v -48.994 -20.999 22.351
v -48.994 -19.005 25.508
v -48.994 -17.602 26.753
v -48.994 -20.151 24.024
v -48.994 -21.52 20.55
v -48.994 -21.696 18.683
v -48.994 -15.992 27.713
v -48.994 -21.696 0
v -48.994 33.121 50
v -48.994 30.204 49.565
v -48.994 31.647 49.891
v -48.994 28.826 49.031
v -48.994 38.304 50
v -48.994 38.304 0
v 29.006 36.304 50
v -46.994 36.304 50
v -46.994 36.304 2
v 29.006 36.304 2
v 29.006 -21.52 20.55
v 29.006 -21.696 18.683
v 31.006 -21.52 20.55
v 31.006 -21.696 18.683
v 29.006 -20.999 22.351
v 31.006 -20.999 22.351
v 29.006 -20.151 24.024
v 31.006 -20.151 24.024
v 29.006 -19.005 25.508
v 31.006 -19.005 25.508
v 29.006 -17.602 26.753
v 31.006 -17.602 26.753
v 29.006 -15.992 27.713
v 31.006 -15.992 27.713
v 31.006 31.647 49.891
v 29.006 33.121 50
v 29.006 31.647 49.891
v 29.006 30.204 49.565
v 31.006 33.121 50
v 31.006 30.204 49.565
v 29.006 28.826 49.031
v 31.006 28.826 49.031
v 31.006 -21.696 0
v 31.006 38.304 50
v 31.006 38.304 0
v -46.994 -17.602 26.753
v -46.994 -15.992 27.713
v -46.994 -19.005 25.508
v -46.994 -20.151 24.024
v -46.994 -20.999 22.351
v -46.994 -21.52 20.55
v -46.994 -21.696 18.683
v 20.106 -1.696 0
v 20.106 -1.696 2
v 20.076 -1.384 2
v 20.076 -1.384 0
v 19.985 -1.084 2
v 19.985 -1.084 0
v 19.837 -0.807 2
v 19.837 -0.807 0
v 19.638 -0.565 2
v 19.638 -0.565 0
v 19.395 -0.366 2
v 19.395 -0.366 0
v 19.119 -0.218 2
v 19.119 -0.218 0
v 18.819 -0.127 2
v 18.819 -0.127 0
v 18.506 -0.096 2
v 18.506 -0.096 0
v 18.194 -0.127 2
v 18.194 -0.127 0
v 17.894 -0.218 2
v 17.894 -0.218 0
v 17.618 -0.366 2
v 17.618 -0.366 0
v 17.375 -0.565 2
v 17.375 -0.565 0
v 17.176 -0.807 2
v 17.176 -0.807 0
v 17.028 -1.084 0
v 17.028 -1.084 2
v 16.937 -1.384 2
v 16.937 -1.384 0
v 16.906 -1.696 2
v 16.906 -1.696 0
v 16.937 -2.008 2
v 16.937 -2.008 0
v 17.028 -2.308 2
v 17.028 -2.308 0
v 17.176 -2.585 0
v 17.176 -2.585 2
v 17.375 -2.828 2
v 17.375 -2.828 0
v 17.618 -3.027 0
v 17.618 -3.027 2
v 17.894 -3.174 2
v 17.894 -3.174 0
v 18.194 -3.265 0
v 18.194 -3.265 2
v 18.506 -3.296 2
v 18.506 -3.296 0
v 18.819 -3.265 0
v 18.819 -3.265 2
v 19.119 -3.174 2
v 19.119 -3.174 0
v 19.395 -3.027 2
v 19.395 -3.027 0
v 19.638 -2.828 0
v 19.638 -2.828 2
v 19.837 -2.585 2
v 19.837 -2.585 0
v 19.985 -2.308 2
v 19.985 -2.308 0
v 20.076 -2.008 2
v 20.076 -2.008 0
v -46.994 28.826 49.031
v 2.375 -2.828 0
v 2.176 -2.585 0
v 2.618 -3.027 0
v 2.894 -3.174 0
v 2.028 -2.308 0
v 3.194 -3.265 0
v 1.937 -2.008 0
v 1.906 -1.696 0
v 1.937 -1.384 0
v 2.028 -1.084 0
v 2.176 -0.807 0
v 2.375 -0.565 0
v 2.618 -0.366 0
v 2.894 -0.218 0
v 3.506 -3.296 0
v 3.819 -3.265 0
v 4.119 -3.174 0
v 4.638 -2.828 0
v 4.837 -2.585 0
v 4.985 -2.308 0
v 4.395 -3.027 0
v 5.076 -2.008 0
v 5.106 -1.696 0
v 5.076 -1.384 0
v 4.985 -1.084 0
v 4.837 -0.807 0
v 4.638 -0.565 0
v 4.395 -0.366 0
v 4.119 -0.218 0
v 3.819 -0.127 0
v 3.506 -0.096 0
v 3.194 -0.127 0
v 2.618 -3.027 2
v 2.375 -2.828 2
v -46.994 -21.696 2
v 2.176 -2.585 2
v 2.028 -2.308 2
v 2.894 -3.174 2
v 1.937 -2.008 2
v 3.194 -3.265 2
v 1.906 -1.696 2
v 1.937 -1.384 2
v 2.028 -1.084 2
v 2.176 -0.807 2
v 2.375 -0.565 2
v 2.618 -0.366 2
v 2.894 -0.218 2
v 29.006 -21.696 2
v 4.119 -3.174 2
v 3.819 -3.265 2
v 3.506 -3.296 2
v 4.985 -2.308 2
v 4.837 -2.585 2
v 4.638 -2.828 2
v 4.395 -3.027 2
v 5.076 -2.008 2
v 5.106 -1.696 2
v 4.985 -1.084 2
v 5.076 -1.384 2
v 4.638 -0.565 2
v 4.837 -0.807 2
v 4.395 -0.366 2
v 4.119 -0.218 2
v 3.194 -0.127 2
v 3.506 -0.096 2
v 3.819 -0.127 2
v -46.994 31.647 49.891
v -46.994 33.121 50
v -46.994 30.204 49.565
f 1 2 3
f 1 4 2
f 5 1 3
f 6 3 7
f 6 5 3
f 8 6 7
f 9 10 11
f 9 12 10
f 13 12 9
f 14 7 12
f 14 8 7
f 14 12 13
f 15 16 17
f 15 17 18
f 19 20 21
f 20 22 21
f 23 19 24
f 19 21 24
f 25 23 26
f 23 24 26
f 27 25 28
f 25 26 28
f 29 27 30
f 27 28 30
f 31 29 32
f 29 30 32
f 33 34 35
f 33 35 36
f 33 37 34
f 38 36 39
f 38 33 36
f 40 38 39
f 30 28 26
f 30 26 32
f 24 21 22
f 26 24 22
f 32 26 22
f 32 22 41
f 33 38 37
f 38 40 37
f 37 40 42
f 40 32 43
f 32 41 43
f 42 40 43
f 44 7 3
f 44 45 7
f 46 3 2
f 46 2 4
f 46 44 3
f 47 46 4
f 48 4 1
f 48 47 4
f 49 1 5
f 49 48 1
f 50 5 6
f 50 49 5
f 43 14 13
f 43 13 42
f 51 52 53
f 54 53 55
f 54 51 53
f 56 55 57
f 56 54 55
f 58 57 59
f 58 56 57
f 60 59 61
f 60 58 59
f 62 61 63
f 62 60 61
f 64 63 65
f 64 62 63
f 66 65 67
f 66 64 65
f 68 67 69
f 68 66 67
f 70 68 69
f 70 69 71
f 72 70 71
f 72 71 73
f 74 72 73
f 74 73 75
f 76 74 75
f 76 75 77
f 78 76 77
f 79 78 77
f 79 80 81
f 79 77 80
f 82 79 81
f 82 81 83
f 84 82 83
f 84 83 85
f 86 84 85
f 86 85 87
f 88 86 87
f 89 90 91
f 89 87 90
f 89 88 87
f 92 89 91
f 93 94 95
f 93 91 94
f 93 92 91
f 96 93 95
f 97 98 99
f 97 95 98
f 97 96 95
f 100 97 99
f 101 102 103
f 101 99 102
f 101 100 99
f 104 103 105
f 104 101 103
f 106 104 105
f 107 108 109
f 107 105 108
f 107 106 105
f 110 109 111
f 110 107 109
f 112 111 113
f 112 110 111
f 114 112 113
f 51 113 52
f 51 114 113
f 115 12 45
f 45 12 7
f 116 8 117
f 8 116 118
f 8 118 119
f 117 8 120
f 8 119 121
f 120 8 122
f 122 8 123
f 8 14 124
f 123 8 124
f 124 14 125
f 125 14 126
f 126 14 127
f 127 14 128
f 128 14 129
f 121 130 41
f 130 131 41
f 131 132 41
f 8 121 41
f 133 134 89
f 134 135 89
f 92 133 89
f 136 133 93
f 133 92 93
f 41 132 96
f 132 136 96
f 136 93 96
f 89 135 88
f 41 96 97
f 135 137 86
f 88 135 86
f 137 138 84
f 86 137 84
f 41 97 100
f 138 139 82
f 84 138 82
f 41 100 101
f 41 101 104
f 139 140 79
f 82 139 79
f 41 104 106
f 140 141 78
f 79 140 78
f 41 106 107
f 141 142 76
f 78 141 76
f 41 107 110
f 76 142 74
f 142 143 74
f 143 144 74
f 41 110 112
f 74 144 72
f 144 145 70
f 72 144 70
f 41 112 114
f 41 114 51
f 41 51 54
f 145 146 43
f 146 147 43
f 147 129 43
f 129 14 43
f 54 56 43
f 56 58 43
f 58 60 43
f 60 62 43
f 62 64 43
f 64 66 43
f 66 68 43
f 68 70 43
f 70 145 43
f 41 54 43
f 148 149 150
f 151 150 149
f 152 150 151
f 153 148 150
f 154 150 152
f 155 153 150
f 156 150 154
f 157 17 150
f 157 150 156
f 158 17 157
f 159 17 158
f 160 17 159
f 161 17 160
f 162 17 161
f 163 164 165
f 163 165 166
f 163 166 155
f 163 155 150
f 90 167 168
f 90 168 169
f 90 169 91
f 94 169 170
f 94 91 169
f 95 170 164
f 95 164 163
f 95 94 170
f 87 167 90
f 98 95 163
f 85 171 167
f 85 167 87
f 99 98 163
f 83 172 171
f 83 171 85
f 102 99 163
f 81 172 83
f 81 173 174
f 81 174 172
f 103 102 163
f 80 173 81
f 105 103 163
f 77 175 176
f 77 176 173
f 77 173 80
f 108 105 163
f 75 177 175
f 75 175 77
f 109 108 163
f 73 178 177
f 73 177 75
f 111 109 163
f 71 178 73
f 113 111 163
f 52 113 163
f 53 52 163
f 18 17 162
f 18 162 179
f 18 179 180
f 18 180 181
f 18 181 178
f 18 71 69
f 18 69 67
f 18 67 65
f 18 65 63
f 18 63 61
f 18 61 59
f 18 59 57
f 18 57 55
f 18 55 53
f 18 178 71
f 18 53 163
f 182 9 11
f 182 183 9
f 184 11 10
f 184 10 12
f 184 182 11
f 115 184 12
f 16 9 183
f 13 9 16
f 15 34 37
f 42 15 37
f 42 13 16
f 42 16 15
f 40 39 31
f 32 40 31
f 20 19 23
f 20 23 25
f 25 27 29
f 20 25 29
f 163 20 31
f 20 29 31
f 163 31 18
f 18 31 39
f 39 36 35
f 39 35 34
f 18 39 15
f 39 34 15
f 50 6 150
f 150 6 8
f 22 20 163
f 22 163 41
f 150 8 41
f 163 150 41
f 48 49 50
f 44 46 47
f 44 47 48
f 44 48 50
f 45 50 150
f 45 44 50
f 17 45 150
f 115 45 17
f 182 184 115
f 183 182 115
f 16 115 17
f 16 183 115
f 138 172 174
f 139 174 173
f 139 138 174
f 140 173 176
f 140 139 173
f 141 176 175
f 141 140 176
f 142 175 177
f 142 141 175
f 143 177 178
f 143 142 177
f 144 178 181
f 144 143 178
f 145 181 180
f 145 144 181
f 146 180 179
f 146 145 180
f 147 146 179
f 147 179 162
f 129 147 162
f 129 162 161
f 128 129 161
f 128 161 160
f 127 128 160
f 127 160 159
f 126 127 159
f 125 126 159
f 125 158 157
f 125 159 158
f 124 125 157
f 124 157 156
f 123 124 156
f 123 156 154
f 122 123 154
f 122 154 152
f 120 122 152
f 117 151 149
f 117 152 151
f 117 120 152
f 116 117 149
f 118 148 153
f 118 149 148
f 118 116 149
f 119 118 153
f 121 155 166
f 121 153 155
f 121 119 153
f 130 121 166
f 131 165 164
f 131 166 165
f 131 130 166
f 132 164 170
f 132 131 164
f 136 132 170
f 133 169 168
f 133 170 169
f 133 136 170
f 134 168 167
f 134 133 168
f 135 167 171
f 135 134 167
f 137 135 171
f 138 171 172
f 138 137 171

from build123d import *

# Parameters (mm, degrees)
SKETCH_1_W          = 80
SKETCH_1_H          = 60
SKETCH_1_R          = 1.6
EXTRUDE_1_DEPTH     = 50
SKETCH_2_W          = 76
SKETCH_2_H          = 58
CUT_EXTRUDE_1_DEPTH = 48
CUT_EXTRUDE_2_DEPTH = 81
FILLET_1_R          = 10


with BuildPart() as part:
    # 草图1 → 凸台-拉伸1 (new body)
    with BuildSketch(Plane.XY):
        with Locations((-8.993547962, 8.303805385)):
            Rectangle(SKETCH_1_W, SKETCH_1_H)
        with Locations((3.506452038, -1.696194615)):
            Circle(SKETCH_1_R, mode=Mode.SUBTRACT)
        with Locations((18.506452038, -1.696194615)):
            Circle(SKETCH_1_R, mode=Mode.SUBTRACT)
    extrude(amount=EXTRUDE_1_DEPTH)

    # 草图2 → 切除-拉伸1 (cut)
    with BuildSketch(Plane.XY.offset(50)):
        with Locations((-8.993547962, 7.303805385)):
            Rectangle(SKETCH_2_W, SKETCH_2_H)
    extrude(amount=-CUT_EXTRUDE_1_DEPTH, mode=Mode.SUBTRACT)

    # 草图3 → 切除-拉伸2 (cut, through all)
    with BuildSketch(Plane.ZY.offset(48.993547962)):
        Polygon((50, 30.864185465), (25, -21.696194615), (50, -21.696194615), align=None)
    extrude(amount=-CUT_EXTRUDE_2_DEPTH, mode=Mode.SUBTRACT)

    # 圆角1
    fillet_1_edges = [part.edges().sort_by_distance(p)[0] for p in [
        (-47.993547962, 30.864185465, 50),
        (30.006452038, 30.864185465, 50),
        (-47.993547962, -21.696194615, 25),
        (30.006452038, -21.696194615, 25),
    ]]
    fillet(fillet_1_edges, radius=FILLET_1_R)


solid = part.part
